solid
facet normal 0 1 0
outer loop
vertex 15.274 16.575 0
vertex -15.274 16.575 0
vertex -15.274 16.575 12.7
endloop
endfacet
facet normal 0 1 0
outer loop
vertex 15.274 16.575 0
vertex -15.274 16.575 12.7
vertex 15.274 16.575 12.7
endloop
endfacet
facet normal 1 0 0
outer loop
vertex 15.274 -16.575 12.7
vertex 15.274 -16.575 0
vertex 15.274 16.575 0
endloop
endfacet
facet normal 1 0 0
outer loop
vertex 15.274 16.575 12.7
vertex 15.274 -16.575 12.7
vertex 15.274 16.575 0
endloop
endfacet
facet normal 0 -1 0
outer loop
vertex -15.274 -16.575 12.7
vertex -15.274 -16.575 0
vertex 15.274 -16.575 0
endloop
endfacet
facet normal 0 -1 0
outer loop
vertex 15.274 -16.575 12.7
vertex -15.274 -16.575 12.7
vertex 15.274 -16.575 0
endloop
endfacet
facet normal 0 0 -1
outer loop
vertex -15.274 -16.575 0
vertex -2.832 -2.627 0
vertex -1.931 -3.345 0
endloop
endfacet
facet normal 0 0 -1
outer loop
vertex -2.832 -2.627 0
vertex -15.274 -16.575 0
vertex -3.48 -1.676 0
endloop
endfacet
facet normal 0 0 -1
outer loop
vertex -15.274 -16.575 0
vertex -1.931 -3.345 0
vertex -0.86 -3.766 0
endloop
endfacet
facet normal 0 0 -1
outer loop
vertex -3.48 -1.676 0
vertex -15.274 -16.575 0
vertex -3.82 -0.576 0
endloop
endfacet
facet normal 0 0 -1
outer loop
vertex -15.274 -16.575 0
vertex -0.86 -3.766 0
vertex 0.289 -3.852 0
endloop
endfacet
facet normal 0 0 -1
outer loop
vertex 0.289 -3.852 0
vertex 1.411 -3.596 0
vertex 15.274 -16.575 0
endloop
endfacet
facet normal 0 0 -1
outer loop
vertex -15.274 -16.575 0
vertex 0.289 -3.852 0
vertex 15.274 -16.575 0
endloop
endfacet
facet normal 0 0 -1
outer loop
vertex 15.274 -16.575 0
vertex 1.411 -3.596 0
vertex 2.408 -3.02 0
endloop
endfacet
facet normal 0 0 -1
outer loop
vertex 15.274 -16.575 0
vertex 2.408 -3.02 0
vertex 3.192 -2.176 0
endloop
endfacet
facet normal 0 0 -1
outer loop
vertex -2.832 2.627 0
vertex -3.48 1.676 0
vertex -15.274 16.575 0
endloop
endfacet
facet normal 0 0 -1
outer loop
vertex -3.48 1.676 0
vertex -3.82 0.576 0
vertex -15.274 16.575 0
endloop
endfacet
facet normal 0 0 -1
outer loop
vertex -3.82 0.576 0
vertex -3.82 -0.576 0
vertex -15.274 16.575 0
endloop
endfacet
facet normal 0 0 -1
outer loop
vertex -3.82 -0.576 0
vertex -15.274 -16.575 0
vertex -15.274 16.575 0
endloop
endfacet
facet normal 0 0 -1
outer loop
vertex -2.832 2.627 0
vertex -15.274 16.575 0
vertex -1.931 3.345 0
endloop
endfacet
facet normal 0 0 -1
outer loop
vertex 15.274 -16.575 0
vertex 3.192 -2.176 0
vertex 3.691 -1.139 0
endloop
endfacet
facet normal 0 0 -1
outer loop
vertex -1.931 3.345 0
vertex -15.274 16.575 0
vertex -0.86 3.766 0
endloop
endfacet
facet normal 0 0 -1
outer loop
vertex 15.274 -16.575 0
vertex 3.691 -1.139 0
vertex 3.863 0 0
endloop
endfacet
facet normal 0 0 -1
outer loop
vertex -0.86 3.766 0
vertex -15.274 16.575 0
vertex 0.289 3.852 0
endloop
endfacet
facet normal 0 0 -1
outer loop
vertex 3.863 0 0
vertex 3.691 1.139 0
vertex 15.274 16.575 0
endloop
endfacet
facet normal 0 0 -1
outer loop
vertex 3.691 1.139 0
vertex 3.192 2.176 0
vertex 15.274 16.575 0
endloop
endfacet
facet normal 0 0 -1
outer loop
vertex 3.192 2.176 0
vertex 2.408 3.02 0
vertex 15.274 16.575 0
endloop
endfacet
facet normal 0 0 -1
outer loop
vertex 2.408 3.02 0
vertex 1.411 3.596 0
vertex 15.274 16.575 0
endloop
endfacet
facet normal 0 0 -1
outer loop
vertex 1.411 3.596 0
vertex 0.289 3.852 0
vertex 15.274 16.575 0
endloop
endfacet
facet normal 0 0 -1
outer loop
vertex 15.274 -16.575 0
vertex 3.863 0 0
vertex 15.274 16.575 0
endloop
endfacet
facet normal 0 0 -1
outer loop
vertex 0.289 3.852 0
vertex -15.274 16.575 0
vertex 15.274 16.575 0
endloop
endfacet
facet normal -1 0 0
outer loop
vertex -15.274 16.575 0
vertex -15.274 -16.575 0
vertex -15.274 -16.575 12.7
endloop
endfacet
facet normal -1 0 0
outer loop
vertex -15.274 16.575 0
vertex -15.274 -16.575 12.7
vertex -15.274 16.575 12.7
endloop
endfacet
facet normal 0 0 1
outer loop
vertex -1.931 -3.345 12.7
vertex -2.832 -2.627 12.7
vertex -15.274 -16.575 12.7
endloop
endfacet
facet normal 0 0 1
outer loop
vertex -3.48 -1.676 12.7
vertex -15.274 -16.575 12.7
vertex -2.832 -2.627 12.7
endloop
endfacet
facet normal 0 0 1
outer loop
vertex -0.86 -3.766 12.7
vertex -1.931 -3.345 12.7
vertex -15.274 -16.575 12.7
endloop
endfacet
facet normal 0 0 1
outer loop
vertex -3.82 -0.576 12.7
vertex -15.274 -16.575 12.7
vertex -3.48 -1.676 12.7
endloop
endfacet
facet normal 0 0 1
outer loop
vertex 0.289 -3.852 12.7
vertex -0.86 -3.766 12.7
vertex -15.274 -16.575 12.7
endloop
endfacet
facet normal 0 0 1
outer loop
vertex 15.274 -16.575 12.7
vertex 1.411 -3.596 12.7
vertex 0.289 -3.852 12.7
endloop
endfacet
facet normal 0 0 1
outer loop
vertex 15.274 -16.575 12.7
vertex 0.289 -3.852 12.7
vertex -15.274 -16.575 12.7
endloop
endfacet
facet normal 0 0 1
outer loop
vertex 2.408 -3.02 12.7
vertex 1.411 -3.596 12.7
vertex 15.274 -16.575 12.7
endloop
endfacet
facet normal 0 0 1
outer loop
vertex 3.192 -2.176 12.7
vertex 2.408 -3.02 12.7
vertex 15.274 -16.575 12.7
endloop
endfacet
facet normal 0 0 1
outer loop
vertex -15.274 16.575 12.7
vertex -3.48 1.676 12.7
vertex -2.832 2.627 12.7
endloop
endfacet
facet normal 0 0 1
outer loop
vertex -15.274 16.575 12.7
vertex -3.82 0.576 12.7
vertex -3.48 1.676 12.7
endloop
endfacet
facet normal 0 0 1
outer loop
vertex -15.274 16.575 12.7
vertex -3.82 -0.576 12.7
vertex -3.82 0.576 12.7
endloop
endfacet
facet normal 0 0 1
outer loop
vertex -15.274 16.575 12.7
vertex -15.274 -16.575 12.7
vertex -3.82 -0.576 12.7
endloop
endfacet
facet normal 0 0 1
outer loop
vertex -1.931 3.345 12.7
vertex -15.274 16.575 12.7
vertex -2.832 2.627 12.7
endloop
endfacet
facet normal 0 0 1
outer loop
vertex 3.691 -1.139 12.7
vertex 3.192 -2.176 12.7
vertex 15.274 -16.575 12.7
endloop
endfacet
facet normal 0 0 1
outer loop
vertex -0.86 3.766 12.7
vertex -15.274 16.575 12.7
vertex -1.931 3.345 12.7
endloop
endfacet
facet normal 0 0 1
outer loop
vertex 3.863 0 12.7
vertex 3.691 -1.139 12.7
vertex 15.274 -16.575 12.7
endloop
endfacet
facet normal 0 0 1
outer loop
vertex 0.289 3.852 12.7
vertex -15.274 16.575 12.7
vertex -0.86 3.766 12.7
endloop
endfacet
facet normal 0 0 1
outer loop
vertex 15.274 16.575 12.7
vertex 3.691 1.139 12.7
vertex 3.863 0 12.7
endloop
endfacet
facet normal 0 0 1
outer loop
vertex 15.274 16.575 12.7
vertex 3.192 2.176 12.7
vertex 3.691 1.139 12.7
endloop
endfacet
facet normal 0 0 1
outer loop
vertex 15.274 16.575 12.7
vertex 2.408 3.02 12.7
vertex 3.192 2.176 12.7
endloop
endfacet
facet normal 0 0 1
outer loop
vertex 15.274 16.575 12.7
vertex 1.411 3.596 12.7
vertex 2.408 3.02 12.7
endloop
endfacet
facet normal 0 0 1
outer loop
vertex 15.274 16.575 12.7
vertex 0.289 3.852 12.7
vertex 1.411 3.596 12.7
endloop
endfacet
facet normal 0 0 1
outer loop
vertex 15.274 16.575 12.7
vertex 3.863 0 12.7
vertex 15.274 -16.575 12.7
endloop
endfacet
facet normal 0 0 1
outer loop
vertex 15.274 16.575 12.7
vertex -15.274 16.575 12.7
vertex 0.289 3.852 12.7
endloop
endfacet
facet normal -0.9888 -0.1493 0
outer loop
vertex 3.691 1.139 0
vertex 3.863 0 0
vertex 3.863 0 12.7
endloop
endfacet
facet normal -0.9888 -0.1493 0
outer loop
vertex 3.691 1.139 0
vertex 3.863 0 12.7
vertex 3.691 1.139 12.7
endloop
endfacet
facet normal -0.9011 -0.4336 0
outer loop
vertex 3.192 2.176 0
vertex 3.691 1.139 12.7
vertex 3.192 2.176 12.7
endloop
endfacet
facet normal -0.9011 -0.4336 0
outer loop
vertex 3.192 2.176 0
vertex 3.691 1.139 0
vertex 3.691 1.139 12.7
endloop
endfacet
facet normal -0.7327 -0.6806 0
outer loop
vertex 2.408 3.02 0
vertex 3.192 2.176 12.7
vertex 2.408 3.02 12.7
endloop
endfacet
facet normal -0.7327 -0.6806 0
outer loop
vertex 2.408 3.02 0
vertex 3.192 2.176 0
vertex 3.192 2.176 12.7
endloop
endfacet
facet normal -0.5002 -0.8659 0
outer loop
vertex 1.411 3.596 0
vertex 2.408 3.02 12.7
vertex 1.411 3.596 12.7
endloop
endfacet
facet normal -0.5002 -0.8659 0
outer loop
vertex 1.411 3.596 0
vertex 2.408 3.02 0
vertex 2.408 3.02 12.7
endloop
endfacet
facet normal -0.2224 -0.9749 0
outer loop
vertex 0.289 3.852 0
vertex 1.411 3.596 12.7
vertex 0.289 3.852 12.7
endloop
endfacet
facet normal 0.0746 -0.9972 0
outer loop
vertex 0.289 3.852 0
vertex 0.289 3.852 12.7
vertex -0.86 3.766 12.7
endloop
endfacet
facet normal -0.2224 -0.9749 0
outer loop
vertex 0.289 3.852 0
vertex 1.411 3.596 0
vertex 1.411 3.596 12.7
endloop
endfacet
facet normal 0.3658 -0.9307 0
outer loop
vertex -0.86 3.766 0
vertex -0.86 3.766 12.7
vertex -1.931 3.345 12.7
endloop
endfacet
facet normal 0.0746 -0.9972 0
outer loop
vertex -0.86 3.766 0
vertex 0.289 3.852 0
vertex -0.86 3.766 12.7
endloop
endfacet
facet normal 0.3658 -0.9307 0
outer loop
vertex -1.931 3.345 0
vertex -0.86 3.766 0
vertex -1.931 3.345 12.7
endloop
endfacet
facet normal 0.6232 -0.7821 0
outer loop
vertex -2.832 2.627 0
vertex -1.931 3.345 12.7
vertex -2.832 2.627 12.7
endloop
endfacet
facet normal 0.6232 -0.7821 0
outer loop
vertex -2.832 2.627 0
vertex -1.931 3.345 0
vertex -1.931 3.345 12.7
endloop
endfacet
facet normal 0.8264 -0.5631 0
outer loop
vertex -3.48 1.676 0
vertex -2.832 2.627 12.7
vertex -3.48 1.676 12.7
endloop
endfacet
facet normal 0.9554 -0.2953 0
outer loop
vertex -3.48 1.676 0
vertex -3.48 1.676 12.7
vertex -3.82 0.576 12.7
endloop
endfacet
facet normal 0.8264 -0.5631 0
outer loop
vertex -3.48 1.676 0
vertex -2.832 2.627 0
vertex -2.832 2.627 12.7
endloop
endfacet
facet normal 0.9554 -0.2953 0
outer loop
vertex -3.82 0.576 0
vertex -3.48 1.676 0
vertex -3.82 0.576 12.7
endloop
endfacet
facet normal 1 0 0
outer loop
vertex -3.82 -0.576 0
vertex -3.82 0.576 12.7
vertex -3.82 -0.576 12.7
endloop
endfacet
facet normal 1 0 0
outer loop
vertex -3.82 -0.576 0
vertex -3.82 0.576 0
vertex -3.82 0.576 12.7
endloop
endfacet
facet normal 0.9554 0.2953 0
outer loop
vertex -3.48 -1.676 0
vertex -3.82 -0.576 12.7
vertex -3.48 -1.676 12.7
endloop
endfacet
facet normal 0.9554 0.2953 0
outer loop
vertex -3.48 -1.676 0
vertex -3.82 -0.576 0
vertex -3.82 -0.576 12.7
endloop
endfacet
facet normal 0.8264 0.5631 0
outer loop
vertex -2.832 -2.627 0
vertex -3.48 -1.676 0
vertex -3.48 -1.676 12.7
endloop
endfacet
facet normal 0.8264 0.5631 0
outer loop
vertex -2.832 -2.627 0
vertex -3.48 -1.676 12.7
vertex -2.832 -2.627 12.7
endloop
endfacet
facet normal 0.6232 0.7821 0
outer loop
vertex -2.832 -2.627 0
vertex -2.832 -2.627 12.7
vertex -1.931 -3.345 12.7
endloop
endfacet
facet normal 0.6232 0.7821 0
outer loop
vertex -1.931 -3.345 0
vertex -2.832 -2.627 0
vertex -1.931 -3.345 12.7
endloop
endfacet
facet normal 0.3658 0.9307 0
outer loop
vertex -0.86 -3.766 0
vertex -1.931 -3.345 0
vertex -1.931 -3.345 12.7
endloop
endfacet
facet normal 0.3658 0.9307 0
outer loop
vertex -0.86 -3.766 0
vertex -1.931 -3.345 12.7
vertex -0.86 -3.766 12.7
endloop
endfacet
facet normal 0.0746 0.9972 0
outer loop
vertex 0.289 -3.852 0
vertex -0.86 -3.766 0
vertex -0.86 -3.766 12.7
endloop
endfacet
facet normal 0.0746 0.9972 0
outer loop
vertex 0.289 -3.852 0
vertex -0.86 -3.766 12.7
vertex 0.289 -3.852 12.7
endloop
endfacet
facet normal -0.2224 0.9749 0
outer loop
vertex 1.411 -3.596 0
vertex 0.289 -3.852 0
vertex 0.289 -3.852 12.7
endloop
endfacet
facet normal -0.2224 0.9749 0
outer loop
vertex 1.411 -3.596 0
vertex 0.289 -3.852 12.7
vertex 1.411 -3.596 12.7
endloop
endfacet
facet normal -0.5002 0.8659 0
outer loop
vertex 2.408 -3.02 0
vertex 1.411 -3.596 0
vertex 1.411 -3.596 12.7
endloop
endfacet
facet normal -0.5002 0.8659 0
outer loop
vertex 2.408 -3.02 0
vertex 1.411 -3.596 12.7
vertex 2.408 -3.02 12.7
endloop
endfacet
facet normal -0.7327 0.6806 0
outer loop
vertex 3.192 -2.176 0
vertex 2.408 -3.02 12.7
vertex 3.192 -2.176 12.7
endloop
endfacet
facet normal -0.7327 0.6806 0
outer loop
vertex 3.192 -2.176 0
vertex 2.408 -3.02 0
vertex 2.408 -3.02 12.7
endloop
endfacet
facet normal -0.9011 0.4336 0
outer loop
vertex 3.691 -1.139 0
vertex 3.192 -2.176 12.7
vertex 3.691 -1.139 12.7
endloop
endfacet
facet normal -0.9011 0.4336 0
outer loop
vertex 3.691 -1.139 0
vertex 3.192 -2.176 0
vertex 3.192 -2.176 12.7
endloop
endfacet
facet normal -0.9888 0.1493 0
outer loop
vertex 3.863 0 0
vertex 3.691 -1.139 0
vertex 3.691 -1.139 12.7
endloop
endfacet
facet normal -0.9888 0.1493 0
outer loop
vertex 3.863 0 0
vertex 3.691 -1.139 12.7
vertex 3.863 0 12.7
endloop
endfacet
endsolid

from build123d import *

# Parameters (mm, degrees)
F1_W     = 30.5479690433
F1_H     = 33.1509709358
F1_W_2   = 16.4528656751
F1_H_2   = 12.8562636673
F1_R     = 3.862880512
F2_DEPTH = 12.7


with BuildPart() as f2:
    # F1 (on face) → F2 (new body)
    with BuildSketch(Plane.XY):
        Rectangle(F1_W, F1_H)
        Rectangle(F1_W_2, F1_H_2, mode=Mode.SUBTRACT)
        Rectangle(F1_W_2, F1_H_2)
        Circle(F1_R, mode=Mode.SUBTRACT)
    extrude(amount=F2_DEPTH)


solid = f2.part
